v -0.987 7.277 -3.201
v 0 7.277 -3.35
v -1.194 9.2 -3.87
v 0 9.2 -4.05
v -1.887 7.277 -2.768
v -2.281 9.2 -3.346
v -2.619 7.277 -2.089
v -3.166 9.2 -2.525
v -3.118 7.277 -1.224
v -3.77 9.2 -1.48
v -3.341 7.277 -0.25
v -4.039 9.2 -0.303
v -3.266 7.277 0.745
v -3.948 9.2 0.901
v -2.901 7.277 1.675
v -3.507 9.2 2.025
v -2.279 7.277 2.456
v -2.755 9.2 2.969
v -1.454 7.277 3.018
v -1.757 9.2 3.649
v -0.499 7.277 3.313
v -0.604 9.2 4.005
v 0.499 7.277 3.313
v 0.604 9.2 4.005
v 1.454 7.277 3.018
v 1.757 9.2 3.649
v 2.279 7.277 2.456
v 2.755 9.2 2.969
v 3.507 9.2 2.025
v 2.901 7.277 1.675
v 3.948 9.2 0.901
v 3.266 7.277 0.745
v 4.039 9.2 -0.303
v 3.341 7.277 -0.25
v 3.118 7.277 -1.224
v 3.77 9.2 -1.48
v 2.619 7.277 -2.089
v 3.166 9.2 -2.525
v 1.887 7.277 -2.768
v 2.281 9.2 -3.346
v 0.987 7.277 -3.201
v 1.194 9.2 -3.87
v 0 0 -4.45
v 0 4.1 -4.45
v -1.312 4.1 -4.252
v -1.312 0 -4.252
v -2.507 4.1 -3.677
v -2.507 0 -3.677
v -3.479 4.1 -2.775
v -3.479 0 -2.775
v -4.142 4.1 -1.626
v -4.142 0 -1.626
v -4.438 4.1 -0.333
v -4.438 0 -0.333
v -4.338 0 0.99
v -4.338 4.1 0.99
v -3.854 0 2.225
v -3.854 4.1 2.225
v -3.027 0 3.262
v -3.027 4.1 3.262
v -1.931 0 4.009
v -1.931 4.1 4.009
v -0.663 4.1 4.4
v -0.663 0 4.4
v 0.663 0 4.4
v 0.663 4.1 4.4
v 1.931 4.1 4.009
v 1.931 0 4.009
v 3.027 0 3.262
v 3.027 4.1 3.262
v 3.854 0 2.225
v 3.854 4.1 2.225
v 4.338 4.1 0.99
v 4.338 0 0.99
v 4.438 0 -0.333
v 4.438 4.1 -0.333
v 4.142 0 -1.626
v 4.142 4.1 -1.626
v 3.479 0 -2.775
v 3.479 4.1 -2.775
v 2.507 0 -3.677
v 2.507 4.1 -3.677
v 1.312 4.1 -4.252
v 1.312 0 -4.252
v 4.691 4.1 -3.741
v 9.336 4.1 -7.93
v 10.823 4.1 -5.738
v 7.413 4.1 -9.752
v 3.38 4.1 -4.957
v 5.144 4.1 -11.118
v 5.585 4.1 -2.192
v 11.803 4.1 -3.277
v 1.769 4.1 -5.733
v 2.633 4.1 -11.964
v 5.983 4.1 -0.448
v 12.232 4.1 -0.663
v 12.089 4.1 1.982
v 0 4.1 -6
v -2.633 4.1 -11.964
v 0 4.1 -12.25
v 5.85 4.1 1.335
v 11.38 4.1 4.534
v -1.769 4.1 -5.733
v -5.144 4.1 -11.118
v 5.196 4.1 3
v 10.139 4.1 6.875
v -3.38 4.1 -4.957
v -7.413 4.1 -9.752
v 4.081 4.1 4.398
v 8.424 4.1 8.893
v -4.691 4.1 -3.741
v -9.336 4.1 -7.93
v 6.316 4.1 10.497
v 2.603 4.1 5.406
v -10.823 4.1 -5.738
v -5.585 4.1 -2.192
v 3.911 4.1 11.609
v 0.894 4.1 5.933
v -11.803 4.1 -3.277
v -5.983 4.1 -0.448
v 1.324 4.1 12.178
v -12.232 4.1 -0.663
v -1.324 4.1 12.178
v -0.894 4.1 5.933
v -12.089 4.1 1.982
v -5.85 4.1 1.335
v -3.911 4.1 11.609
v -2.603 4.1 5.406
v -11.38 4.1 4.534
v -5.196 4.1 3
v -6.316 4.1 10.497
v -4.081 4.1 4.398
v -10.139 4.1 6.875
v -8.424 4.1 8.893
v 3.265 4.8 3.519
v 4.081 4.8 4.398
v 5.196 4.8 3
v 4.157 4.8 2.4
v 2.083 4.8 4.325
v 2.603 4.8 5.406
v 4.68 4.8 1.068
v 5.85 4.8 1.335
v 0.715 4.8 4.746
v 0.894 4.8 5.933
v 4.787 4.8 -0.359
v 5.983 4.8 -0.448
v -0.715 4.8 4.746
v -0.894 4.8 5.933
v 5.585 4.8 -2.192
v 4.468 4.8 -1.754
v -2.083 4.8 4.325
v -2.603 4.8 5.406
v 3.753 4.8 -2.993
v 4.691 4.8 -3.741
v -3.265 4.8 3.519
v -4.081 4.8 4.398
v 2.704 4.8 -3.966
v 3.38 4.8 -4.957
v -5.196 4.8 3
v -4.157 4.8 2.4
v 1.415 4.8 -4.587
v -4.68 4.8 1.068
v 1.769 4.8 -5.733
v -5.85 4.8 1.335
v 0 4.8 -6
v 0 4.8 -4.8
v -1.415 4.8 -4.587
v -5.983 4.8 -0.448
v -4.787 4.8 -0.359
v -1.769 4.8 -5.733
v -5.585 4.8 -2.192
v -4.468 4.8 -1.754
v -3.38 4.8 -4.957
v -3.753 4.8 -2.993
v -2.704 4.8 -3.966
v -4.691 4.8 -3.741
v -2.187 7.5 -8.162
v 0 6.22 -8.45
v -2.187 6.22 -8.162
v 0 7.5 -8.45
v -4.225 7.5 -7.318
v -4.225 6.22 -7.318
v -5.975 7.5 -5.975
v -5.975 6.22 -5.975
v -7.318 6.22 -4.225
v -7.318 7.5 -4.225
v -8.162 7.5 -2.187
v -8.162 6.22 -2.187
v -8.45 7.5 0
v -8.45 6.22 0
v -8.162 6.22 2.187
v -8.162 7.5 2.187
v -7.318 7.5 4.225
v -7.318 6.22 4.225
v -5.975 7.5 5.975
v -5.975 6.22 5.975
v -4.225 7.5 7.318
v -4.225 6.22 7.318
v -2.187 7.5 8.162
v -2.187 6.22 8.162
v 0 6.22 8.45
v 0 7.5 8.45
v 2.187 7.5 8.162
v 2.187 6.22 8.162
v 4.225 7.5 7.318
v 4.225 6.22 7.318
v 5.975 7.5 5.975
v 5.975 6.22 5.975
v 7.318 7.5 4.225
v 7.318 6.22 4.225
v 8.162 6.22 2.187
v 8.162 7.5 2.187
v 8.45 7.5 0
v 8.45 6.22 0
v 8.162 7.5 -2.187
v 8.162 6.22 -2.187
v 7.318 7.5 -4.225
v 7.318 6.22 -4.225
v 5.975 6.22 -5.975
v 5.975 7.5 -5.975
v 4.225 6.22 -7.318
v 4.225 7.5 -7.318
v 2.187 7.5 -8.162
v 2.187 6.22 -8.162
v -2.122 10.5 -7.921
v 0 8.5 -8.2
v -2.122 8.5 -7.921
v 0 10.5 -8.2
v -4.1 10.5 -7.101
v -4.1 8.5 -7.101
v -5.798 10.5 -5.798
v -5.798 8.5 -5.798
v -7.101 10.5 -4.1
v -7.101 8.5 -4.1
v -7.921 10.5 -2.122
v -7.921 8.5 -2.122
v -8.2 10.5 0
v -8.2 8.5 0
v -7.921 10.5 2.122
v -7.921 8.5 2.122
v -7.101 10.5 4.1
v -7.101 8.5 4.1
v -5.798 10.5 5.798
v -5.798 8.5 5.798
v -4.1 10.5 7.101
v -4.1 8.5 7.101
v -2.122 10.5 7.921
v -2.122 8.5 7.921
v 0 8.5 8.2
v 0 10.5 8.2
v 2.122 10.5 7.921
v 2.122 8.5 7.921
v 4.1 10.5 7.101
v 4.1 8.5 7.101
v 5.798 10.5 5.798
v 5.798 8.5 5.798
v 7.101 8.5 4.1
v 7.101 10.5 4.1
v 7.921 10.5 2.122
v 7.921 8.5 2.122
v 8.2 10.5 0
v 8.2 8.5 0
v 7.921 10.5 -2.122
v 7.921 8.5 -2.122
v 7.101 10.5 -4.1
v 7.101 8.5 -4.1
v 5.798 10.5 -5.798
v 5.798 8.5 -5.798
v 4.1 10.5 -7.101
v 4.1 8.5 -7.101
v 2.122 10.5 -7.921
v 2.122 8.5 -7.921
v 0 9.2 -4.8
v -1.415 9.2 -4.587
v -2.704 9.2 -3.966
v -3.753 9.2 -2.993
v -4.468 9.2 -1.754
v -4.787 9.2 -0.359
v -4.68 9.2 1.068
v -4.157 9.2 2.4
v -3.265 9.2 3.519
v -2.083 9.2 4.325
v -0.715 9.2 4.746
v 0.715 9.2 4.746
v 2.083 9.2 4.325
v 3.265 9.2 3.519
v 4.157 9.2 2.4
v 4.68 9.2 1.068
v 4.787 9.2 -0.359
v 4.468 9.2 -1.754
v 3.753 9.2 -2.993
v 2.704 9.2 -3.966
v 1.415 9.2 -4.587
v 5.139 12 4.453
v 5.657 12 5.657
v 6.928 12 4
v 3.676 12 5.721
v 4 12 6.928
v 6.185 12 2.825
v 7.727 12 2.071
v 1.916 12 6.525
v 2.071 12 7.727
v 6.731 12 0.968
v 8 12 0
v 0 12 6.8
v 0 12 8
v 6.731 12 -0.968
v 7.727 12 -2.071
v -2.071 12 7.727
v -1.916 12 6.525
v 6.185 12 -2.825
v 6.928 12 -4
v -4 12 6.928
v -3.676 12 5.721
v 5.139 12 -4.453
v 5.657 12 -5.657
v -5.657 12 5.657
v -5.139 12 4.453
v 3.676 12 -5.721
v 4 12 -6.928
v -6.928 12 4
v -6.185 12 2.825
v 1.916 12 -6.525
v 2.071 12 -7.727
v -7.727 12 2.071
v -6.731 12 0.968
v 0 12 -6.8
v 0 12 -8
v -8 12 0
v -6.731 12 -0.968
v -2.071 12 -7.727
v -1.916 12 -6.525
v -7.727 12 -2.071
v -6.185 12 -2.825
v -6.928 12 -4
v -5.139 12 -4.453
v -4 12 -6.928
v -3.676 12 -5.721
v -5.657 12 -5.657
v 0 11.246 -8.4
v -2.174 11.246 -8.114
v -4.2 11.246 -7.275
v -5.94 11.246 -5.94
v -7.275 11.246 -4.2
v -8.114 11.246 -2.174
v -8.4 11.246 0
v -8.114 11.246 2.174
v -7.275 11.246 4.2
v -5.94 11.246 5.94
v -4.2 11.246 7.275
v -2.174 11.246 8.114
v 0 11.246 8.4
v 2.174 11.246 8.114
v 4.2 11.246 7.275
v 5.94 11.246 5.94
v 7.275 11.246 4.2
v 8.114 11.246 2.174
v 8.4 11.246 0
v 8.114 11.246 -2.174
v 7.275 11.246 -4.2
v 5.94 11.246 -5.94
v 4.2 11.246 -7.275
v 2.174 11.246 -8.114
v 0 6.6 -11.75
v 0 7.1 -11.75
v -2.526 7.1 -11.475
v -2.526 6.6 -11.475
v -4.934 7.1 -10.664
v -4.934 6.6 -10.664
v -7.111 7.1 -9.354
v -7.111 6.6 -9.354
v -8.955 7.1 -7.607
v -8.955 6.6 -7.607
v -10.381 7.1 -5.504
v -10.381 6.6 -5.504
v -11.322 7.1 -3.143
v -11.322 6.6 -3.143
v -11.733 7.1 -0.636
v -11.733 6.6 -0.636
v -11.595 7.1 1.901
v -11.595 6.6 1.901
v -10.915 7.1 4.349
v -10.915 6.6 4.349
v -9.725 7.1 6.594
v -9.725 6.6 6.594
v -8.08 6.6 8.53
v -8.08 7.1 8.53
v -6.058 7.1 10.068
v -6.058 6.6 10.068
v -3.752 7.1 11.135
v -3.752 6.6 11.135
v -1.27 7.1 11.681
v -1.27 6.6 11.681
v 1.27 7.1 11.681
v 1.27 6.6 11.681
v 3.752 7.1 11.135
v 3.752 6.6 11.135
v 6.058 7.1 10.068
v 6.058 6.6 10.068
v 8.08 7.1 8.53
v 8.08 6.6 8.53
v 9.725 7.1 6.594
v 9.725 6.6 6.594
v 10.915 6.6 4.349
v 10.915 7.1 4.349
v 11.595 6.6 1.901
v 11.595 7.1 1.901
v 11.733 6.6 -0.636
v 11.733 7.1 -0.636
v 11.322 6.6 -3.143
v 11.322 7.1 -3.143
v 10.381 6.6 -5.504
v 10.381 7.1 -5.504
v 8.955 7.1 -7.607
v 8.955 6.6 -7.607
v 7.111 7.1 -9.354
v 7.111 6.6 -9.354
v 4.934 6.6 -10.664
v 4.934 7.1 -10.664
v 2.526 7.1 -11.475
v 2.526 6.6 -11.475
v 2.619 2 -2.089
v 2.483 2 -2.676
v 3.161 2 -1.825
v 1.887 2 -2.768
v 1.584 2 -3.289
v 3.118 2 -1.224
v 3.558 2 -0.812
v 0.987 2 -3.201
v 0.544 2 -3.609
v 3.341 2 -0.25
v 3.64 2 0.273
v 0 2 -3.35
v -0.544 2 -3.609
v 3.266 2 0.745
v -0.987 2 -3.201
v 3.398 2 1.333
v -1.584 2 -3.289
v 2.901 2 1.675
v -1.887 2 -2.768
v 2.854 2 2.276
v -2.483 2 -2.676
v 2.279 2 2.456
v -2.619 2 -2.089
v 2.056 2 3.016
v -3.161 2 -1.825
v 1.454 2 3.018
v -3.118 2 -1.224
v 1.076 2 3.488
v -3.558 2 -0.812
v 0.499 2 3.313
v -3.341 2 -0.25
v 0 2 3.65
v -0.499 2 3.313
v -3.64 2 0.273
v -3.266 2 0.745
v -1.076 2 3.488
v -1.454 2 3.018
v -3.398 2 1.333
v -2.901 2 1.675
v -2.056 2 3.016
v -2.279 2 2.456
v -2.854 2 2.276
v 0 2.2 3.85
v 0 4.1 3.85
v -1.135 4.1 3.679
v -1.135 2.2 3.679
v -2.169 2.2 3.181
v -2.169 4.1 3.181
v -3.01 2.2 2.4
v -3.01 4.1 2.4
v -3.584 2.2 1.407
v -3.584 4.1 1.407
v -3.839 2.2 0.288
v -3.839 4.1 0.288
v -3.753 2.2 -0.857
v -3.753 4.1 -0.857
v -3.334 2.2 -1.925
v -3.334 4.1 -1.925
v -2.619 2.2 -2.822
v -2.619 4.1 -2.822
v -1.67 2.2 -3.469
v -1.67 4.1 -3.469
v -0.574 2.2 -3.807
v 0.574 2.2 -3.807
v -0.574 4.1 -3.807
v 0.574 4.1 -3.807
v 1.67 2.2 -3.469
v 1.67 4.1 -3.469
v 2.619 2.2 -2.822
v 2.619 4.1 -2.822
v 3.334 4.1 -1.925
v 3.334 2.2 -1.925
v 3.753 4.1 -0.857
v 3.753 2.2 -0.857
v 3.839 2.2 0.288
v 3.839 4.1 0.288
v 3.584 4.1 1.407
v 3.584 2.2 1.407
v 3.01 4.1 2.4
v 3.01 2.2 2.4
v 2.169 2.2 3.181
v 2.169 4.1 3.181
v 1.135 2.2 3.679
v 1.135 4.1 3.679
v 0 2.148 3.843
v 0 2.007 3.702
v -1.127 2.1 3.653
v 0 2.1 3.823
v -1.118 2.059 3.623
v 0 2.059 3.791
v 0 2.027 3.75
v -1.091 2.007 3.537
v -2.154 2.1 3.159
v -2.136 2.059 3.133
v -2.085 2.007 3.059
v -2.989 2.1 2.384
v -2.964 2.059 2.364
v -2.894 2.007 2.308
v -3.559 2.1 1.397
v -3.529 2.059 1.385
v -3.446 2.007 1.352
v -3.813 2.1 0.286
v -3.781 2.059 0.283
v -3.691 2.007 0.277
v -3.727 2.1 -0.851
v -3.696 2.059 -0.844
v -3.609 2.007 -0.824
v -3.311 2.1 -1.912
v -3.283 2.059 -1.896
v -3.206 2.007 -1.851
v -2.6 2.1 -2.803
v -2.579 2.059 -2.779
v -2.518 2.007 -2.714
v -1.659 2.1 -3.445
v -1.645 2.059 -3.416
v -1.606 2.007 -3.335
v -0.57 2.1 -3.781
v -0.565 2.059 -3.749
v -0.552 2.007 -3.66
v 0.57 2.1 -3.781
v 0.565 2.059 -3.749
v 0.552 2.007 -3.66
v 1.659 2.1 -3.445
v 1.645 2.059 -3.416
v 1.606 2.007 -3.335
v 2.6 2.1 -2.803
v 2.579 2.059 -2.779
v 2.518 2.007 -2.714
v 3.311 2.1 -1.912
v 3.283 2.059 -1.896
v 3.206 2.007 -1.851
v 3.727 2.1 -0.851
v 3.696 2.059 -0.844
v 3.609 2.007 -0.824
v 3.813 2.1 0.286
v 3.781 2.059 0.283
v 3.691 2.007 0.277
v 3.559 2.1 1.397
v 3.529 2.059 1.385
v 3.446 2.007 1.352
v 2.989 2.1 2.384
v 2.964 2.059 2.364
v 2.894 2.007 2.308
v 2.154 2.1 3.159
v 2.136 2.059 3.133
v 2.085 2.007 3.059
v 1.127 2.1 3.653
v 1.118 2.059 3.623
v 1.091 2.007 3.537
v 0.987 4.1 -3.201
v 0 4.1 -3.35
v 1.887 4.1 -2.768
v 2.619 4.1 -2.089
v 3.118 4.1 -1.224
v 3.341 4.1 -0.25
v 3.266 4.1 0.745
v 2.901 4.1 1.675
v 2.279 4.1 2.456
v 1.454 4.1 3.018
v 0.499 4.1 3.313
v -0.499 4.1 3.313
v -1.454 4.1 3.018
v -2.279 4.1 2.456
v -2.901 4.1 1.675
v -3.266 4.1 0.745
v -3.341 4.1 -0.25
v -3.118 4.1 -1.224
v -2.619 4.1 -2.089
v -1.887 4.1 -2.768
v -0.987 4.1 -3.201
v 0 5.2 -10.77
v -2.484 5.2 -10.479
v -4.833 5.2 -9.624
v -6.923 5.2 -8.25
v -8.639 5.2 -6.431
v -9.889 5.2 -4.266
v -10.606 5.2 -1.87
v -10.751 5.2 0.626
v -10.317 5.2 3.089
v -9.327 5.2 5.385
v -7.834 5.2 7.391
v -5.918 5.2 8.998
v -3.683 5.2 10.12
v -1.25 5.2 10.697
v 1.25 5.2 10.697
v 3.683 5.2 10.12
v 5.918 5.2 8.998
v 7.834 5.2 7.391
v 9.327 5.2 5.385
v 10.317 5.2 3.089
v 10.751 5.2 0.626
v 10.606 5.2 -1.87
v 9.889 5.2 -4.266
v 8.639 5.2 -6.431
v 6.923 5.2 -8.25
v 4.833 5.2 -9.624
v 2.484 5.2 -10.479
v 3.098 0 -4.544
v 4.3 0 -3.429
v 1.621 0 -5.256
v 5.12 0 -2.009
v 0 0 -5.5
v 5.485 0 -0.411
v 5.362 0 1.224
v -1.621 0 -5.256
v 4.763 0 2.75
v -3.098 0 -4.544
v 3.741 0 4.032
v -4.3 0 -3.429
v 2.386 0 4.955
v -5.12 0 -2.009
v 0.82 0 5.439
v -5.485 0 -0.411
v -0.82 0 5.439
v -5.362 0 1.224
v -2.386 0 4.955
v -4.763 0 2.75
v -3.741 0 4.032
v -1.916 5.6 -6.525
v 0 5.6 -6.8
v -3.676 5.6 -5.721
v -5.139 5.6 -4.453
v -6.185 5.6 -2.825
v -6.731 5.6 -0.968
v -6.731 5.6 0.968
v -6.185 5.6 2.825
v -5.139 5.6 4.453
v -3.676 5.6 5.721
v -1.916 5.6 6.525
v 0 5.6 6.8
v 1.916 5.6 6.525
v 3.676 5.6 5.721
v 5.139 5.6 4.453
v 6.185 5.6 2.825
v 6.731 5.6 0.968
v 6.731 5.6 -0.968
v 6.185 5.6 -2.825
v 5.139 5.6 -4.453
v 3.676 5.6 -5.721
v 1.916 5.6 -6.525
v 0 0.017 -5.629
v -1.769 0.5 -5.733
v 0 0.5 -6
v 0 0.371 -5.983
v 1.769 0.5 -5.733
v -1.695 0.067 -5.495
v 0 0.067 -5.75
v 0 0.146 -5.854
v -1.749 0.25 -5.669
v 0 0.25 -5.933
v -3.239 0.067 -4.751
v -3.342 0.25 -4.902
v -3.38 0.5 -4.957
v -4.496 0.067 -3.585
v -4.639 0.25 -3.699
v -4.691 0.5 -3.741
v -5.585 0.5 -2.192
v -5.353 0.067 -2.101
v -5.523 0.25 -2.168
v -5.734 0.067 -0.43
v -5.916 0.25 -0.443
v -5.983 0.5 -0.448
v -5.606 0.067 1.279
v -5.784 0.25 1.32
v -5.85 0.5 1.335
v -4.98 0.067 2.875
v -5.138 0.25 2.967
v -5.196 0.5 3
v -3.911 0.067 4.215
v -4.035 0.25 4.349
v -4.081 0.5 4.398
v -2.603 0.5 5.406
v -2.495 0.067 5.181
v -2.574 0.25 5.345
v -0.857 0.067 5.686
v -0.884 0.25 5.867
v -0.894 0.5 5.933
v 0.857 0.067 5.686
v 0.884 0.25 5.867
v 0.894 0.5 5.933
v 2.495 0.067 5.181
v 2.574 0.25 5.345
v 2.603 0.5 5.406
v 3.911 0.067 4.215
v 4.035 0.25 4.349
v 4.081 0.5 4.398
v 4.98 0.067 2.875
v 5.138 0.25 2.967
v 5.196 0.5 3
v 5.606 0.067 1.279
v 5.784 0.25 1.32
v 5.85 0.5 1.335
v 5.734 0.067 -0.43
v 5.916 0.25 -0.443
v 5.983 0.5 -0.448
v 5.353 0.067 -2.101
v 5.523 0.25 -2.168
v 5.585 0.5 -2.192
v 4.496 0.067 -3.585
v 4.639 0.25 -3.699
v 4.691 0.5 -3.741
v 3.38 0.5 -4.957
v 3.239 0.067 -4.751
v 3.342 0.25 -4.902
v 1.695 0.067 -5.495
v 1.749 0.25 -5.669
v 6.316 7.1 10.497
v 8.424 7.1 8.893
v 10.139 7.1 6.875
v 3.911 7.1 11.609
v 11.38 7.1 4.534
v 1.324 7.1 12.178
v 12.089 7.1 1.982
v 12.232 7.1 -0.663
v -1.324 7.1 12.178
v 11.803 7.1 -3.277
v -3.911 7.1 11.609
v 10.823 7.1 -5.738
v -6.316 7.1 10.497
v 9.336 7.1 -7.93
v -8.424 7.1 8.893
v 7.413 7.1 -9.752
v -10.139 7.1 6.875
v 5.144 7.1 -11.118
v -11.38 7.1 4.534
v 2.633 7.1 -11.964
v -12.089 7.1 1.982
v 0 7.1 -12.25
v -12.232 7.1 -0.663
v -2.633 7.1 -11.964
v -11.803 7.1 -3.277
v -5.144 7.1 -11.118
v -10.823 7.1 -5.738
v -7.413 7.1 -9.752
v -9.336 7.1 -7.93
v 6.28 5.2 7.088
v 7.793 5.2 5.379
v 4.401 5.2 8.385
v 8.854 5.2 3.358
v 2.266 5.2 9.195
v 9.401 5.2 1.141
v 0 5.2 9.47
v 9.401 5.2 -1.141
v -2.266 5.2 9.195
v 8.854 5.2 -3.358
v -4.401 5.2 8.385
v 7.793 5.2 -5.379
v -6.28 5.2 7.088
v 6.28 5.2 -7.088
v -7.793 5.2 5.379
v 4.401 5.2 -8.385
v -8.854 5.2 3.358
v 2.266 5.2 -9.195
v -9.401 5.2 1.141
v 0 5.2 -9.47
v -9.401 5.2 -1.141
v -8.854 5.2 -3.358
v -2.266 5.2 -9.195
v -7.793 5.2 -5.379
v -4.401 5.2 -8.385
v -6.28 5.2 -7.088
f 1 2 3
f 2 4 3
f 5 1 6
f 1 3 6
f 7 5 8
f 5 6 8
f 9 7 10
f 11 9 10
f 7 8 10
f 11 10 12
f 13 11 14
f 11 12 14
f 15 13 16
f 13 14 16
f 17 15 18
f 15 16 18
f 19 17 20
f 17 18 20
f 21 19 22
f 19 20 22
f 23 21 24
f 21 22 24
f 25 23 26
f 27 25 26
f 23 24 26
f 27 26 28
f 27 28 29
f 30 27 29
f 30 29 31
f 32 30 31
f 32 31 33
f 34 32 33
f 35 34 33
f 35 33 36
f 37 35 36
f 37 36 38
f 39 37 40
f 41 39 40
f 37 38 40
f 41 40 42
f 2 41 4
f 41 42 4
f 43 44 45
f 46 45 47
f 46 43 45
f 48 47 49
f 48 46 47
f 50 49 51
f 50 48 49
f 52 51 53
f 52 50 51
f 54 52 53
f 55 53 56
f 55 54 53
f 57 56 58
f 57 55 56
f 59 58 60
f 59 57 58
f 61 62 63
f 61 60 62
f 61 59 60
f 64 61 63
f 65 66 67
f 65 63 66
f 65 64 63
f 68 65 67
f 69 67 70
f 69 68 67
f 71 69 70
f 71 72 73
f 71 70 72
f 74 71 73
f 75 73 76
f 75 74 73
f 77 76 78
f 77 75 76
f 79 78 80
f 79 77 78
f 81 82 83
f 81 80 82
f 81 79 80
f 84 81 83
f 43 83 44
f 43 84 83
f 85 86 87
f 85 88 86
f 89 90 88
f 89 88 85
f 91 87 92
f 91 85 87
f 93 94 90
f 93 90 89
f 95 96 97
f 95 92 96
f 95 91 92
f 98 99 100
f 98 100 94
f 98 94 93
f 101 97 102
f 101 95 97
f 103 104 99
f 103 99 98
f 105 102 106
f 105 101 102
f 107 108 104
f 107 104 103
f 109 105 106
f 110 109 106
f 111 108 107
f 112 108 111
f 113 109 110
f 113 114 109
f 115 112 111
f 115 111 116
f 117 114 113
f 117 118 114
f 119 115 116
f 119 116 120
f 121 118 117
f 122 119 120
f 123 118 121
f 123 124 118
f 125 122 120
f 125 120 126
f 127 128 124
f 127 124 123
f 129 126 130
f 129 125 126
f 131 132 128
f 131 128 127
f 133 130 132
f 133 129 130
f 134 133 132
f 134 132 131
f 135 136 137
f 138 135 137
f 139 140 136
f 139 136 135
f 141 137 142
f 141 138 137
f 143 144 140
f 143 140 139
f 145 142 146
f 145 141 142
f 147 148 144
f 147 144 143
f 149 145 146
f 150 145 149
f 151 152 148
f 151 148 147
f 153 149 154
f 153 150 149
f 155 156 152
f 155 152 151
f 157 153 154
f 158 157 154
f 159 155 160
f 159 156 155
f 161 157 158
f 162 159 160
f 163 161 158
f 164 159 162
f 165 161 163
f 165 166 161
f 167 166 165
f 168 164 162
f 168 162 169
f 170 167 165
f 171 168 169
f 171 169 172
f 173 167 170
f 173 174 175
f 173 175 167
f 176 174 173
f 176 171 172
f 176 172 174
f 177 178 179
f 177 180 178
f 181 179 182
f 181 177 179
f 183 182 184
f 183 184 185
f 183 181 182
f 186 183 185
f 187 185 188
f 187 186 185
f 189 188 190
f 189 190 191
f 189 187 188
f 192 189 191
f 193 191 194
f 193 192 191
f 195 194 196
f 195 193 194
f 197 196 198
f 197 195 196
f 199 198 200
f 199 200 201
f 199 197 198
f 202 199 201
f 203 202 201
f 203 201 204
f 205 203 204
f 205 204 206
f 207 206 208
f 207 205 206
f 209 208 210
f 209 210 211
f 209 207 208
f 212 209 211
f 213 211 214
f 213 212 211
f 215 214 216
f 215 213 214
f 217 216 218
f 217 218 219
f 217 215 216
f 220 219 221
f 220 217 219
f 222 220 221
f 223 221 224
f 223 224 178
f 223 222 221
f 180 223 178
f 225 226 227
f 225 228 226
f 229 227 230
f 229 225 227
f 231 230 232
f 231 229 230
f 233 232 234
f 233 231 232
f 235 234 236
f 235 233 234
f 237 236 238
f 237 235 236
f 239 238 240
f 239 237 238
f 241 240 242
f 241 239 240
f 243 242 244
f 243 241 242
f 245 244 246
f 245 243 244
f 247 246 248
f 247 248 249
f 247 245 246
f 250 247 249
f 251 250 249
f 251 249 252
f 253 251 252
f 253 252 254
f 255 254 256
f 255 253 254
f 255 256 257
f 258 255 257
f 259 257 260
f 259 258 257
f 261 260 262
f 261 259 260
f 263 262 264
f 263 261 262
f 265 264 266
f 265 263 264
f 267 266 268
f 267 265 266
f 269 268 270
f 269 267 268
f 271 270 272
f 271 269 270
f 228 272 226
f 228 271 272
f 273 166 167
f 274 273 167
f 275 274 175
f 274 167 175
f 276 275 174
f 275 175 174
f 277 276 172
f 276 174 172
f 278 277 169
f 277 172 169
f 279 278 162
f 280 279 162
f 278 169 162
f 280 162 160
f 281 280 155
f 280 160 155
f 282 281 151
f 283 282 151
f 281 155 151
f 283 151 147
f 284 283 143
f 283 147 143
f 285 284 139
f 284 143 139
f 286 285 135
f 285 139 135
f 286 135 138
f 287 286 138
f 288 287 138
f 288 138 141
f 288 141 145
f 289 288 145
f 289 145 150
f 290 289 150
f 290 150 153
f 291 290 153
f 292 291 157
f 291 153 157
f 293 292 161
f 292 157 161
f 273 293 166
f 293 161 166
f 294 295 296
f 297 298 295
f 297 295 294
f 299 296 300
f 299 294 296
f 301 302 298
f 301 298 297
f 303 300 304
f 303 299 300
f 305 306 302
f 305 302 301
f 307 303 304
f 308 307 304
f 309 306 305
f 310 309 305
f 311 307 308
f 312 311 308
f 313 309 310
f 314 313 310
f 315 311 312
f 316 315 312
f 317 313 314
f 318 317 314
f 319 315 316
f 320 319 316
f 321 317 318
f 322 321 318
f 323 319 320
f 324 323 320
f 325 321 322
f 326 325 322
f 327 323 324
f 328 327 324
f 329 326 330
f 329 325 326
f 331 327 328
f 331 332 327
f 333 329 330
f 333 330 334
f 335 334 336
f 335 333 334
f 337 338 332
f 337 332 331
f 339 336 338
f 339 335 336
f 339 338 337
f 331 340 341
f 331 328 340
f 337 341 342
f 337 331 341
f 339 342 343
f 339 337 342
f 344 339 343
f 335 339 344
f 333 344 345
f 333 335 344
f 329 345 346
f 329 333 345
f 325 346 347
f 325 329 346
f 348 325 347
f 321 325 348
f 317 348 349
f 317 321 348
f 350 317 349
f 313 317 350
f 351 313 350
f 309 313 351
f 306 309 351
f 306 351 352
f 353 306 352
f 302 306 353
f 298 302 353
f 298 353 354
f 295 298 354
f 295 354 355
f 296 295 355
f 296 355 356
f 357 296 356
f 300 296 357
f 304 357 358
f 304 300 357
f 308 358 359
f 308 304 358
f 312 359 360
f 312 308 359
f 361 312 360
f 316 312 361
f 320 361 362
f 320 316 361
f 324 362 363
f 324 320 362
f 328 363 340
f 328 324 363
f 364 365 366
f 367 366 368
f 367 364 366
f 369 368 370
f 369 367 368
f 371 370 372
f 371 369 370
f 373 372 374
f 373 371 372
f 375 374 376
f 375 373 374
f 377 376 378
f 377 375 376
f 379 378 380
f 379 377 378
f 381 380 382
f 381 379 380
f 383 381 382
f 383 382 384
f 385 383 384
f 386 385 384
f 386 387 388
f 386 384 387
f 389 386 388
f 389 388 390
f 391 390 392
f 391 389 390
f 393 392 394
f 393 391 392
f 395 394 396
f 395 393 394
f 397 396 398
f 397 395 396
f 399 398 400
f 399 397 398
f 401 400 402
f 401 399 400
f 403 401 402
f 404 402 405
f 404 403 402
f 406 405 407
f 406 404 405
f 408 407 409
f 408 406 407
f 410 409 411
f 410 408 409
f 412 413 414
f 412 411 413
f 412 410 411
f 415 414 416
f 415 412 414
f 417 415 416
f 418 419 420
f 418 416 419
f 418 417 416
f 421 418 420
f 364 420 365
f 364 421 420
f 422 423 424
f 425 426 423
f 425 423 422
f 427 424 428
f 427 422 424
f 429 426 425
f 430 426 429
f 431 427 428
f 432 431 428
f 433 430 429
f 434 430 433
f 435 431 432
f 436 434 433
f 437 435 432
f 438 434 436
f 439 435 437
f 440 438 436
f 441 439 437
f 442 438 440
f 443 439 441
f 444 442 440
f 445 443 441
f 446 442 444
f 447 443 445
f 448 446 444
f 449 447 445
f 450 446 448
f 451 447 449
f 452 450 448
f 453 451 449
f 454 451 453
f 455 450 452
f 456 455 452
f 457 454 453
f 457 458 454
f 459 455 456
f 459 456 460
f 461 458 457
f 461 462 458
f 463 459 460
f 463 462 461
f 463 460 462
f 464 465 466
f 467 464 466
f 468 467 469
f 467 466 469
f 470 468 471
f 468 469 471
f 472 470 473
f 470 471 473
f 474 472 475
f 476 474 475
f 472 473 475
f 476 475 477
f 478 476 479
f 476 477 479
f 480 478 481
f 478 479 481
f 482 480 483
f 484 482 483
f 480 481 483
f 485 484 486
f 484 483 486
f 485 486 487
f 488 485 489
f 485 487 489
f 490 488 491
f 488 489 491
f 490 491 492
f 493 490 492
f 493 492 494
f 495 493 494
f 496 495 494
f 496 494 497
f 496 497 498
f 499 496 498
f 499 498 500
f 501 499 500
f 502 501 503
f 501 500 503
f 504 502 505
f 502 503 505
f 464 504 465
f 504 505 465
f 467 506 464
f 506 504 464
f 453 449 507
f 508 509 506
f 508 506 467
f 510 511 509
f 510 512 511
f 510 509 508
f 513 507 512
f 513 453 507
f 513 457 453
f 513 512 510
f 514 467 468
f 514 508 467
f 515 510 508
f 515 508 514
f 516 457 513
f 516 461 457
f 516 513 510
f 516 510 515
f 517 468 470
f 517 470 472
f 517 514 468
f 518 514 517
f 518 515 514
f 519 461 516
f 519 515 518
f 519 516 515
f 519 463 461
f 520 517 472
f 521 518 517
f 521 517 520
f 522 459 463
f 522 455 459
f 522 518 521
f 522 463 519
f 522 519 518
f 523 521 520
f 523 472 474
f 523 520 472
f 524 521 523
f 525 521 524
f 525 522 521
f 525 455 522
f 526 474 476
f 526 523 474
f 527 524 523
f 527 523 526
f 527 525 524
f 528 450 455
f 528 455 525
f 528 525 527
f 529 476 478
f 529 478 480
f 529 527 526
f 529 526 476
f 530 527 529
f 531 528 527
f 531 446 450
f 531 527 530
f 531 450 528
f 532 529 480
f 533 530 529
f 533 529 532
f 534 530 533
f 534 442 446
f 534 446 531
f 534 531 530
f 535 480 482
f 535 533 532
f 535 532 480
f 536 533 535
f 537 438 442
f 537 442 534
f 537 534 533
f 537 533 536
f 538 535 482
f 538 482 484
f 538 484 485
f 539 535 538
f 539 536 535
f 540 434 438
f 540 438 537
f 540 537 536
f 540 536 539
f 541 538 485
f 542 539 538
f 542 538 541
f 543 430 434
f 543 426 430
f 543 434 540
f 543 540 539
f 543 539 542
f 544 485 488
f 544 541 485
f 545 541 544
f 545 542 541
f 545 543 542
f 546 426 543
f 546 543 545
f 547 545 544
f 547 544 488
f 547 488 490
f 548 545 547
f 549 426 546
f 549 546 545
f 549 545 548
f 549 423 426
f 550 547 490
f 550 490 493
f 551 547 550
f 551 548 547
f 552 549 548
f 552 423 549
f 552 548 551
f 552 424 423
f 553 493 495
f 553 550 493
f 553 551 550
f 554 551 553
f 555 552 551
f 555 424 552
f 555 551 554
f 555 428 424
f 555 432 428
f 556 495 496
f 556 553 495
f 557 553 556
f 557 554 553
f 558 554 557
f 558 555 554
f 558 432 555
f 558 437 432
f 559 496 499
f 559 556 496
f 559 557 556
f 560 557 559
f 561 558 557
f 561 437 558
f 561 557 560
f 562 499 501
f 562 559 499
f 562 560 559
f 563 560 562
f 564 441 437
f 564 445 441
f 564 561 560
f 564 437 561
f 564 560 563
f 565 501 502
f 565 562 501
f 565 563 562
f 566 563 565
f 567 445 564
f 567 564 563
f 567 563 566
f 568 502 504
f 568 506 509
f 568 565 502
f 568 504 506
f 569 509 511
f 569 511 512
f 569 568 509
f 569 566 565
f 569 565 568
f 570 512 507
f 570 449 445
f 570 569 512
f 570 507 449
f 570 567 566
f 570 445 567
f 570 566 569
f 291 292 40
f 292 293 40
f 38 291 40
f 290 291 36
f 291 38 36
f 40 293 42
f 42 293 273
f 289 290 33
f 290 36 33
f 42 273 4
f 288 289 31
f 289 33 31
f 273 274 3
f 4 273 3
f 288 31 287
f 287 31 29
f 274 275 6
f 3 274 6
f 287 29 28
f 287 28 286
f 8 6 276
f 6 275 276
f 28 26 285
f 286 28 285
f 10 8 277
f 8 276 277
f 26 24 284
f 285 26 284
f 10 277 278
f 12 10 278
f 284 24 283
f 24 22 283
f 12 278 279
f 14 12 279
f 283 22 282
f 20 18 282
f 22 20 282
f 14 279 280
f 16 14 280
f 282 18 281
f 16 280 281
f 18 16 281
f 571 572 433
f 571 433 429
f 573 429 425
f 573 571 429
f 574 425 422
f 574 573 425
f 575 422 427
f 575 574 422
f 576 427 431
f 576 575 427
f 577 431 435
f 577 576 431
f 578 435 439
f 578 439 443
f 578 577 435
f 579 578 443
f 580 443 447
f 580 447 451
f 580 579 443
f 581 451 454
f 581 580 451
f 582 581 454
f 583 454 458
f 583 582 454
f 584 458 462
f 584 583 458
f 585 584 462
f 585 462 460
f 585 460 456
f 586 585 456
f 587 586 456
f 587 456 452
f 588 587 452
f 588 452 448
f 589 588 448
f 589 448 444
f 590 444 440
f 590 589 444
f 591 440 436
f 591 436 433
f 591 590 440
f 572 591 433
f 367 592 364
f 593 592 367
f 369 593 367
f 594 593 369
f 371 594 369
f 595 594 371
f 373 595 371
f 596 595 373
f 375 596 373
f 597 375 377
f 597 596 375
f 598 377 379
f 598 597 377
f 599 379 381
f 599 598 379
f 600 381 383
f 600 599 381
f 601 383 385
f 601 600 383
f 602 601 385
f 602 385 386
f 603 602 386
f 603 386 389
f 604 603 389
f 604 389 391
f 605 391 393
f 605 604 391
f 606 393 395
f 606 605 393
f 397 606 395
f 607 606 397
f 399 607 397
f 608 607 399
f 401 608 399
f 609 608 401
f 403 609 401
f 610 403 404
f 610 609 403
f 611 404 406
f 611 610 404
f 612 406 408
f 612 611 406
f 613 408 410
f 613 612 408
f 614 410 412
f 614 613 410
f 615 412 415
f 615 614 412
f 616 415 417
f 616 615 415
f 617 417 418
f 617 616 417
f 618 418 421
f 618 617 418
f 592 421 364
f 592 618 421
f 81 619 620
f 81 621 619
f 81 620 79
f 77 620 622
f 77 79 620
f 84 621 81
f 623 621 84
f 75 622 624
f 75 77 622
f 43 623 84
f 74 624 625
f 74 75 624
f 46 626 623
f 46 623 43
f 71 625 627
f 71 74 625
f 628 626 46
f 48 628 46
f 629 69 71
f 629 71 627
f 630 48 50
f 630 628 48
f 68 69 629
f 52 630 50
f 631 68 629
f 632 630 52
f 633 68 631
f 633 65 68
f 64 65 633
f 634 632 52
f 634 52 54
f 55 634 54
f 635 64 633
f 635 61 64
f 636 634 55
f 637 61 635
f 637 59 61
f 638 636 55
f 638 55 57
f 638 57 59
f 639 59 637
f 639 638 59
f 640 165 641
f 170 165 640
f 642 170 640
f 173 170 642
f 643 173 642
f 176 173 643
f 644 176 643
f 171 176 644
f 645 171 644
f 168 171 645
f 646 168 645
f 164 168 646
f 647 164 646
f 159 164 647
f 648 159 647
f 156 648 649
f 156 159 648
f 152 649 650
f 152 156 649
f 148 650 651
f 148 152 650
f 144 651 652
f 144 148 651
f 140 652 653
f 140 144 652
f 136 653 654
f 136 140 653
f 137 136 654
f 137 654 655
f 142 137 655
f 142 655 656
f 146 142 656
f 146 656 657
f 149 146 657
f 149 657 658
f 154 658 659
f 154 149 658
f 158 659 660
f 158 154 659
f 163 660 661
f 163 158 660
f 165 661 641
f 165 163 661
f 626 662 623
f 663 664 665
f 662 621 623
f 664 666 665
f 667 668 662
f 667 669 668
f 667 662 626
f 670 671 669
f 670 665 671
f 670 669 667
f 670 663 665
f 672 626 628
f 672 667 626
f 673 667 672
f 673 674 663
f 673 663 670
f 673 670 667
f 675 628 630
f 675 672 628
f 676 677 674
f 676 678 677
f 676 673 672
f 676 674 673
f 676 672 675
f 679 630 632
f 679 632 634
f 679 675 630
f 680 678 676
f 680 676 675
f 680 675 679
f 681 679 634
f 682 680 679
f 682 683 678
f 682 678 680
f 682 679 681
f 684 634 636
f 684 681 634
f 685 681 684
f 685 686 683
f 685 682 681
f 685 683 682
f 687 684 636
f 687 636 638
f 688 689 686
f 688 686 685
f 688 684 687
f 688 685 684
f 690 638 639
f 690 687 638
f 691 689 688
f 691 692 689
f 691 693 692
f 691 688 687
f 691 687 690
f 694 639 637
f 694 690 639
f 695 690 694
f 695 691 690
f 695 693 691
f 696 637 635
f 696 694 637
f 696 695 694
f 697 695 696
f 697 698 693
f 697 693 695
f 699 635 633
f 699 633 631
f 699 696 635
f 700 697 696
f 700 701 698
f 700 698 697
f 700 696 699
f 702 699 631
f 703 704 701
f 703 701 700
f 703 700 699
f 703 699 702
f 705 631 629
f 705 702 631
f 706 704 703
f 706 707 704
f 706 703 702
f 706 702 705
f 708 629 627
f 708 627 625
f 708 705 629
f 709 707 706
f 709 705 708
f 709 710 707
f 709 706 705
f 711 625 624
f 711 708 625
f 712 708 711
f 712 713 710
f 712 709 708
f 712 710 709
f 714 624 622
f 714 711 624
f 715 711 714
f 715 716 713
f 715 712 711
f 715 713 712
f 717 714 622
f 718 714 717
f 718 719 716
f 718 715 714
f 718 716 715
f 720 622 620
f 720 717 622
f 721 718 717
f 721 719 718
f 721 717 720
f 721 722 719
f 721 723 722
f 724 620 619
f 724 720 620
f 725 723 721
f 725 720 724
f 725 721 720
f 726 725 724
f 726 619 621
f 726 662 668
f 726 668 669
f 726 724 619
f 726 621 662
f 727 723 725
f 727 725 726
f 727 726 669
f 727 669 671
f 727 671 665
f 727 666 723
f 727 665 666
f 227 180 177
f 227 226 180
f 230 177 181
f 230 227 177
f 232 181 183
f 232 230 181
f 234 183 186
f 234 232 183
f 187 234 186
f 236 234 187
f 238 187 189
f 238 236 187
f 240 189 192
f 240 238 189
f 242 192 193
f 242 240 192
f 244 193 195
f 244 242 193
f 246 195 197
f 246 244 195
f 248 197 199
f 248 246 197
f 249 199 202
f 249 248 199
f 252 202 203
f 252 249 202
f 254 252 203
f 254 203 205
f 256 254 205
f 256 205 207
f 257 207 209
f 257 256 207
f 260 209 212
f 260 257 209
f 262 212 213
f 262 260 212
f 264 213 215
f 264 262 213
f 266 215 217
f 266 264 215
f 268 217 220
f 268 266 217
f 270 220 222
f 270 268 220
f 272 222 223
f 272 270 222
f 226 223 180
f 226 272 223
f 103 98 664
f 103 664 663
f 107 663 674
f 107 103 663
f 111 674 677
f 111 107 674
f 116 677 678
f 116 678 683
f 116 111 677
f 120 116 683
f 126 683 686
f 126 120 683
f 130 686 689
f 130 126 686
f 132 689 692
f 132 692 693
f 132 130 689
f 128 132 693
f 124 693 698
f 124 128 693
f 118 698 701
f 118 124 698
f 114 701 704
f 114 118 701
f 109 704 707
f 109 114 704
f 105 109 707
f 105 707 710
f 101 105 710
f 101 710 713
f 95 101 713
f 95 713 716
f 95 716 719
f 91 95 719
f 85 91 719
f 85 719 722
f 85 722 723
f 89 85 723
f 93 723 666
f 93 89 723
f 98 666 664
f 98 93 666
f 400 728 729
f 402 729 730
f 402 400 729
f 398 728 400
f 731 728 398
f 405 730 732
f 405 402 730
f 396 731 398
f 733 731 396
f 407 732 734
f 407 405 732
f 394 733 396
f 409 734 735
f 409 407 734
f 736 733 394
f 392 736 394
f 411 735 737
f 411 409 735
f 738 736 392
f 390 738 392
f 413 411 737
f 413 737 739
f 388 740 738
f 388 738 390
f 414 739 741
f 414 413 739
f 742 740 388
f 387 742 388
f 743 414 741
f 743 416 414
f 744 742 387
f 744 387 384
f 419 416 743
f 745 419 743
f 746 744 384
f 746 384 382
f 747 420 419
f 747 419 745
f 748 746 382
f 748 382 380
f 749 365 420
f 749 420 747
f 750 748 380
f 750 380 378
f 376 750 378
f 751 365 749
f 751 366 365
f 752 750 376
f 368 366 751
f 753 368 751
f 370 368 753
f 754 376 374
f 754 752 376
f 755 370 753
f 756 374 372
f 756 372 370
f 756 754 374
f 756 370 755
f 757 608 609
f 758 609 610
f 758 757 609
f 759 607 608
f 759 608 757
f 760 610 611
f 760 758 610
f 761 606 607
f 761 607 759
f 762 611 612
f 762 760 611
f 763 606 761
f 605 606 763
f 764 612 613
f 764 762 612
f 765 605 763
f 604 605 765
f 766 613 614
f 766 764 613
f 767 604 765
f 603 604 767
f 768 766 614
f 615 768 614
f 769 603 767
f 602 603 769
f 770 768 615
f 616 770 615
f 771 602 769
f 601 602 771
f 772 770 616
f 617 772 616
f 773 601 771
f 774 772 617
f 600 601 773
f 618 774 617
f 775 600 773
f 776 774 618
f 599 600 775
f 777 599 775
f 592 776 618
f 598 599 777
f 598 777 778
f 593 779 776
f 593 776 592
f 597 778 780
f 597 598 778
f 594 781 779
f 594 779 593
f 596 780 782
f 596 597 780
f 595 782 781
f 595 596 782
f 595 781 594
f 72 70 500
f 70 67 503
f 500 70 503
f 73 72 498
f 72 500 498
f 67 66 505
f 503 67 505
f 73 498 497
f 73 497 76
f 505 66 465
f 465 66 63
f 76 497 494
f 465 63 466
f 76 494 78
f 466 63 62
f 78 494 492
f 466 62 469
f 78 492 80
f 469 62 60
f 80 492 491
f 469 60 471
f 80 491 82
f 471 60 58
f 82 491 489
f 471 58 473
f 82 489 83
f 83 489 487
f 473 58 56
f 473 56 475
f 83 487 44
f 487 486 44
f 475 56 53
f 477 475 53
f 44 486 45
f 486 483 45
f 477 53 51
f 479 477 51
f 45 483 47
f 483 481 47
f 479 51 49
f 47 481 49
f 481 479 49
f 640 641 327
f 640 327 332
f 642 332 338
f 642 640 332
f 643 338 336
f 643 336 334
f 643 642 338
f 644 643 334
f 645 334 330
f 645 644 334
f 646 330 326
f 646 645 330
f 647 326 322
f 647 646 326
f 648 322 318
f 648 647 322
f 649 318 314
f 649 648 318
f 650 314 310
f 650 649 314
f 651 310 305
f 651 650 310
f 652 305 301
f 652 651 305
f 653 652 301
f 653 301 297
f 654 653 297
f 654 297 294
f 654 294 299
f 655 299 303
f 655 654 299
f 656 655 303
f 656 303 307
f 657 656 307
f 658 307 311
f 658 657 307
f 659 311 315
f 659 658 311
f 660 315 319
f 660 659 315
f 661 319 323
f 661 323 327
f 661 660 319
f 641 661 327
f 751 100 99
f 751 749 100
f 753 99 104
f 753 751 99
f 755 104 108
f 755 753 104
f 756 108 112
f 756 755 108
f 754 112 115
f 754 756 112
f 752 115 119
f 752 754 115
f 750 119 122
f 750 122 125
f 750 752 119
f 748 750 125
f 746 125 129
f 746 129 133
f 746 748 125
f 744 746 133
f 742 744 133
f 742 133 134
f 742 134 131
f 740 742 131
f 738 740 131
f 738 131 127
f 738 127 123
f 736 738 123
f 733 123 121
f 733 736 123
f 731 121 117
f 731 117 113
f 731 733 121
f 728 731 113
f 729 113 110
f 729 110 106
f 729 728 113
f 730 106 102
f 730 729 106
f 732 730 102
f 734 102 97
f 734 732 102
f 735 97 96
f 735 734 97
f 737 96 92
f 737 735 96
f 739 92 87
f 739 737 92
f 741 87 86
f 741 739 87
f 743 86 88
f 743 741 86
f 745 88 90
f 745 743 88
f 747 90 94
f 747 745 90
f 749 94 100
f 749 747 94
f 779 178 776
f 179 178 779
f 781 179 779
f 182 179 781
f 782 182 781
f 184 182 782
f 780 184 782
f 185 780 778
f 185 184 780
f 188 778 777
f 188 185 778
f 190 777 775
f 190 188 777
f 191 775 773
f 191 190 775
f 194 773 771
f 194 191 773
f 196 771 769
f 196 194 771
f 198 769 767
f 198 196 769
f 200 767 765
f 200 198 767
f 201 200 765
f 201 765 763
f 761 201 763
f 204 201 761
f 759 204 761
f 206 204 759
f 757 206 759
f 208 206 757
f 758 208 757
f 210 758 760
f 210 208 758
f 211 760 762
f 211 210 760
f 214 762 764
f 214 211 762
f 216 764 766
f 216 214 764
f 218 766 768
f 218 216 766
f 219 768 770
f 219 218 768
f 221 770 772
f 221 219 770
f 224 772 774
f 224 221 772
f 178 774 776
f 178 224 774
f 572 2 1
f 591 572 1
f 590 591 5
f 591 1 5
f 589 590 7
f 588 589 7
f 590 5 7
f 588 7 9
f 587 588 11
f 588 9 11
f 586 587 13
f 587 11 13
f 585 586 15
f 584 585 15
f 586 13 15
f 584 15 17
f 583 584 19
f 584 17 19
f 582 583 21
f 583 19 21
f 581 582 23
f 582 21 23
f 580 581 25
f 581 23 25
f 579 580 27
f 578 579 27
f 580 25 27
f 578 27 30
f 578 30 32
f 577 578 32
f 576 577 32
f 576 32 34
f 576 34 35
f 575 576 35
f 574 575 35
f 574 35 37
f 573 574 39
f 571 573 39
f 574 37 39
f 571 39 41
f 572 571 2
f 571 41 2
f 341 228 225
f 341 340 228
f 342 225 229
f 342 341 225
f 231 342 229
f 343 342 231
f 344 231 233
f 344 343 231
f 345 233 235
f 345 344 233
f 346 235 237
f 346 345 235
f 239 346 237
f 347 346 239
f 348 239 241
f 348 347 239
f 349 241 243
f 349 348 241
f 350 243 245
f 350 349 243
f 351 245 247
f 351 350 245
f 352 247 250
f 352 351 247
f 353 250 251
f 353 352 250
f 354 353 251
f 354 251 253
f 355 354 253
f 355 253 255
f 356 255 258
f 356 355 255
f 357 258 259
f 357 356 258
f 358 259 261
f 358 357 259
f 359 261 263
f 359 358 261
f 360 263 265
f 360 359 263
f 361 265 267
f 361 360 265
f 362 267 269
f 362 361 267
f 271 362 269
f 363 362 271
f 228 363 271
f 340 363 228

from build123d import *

# Parameters (mm, degrees)
SKETCH4_R           = 3.85
SKETCH4_R_2         = 3.35
BOSS_EXTRUDE1_DEPTH = 2.1
FILLET1_R           = 0.5
FILLET2_R           = 0.2


with BuildPart() as part:
    # Sketch1 → Revolve1 (revolve)
    with BuildSketch(Plane.XY, mode=Mode.PRIVATE) as revolve1_sk:
        Polygon((-12.25, 7.1), (-4.45, 7.1), (-4.45, 0), (-6, 0), (-6, 4.1), (-12.25, 4.1), align=None)
    revolve(revolve1_sk.sketch.rotate(Axis((0, 0, 0), (0, 1, 0)), 270), axis=Axis((0, 0, 0), (0, 1, 0)))

    # Sketch2 → Cut-Revolve1 (revolve, cut)
    with BuildSketch(Plane.XY, mode=Mode.PRIVATE) as cut_revolve1_sk:
        Polygon((-11.75, 7.1), (-11.75, 6.6), (-10.769709447, 5.2), (-6.8, 5.2), (-6.8, 4.8), (0, 4.8), (0, 10.778180343), (-11.75, 10.778180343), align=None)
    revolve(cut_revolve1_sk.sketch.rotate(Axis((0, 4.8, 0), (0, 1, 0)), 270), axis=Axis((0, 4.8, 0), (0, 1, 0)), mode=Mode.SUBTRACT)

    # Sketch3 → Revolve2 (revolve)
    with BuildSketch(Plane.XY, mode=Mode.PRIVATE) as revolve2_sk:
        Polygon((-4.8, 9.2), (-4.8, 4.1), (-3.35, 4.1), (-3.35, 7.276765806), (-4.05, 9.2), align=None)
    revolve(revolve2_sk.sketch.rotate(Axis((0, 0, 0), (0, 1, 0)), 270), axis=Axis((0, 0, 0), (0, 1, 0)))

    # Sketch4 → Boss-Extrude1 (add)
    with BuildSketch(Plane.XZ.offset(-4.1)):
        with Locations(Location((0, 0, 0), (0, 0, 90))):
            Circle(SKETCH4_R)
        with Locations(Location((0, 0, 0), (0, 0, 270))):
            Circle(SKETCH4_R_2, mode=Mode.SUBTRACT)
    extrude(amount=BOSS_EXTRUDE1_DEPTH)

    # Sketch5 → Revolve3 (revolve)
    with BuildSketch(Plane.XY, mode=Mode.PRIVATE) as revolve3_sk:
        Polygon((-8, 12), (-6.8, 12), (-6.8, 5.2), (-9.469709447, 5.2), (-8.45, 6.219709447), (-8.45, 7.5), (-8.2, 8.5), (-8.2, 10.5), (-8.4, 11.246410162), align=None)
    revolve(revolve3_sk.sketch.rotate(Axis((0, 0, 0), (0, 1, 0)), 270), axis=Axis((0, 0, 0), (0, 1, 0)))

    # Sketch6 → Revolve4 (revolve)
    with BuildSketch(Plane.XY, mode=Mode.PRIVATE) as revolve4_sk:
        Polygon((-6.8, 5.6), (-6, 4.8), (-6, 4.543753343), (-7.17505457, 4.543753343), (-7.17505457, 5.6), align=None)
    revolve(revolve4_sk.sketch.rotate(Axis((0, 0, 0), (0, 1, 0)), 270), axis=Axis((0, 0, 0), (0, 1, 0)))

    # Fillet1
    fillet1_edges = [part.edges().sort_by_distance(p)[0] for p in [
        (0, 0, 6),
    ]]
    fillet(fillet1_edges, radius=FILLET1_R)

    # Fillet2
    fillet2_edges = [part.edges().sort_by_distance(p)[0] for p in [
        (0, 2, -3.85),
    ]]
    fillet(fillet2_edges, radius=FILLET2_R)


solid = part.part
